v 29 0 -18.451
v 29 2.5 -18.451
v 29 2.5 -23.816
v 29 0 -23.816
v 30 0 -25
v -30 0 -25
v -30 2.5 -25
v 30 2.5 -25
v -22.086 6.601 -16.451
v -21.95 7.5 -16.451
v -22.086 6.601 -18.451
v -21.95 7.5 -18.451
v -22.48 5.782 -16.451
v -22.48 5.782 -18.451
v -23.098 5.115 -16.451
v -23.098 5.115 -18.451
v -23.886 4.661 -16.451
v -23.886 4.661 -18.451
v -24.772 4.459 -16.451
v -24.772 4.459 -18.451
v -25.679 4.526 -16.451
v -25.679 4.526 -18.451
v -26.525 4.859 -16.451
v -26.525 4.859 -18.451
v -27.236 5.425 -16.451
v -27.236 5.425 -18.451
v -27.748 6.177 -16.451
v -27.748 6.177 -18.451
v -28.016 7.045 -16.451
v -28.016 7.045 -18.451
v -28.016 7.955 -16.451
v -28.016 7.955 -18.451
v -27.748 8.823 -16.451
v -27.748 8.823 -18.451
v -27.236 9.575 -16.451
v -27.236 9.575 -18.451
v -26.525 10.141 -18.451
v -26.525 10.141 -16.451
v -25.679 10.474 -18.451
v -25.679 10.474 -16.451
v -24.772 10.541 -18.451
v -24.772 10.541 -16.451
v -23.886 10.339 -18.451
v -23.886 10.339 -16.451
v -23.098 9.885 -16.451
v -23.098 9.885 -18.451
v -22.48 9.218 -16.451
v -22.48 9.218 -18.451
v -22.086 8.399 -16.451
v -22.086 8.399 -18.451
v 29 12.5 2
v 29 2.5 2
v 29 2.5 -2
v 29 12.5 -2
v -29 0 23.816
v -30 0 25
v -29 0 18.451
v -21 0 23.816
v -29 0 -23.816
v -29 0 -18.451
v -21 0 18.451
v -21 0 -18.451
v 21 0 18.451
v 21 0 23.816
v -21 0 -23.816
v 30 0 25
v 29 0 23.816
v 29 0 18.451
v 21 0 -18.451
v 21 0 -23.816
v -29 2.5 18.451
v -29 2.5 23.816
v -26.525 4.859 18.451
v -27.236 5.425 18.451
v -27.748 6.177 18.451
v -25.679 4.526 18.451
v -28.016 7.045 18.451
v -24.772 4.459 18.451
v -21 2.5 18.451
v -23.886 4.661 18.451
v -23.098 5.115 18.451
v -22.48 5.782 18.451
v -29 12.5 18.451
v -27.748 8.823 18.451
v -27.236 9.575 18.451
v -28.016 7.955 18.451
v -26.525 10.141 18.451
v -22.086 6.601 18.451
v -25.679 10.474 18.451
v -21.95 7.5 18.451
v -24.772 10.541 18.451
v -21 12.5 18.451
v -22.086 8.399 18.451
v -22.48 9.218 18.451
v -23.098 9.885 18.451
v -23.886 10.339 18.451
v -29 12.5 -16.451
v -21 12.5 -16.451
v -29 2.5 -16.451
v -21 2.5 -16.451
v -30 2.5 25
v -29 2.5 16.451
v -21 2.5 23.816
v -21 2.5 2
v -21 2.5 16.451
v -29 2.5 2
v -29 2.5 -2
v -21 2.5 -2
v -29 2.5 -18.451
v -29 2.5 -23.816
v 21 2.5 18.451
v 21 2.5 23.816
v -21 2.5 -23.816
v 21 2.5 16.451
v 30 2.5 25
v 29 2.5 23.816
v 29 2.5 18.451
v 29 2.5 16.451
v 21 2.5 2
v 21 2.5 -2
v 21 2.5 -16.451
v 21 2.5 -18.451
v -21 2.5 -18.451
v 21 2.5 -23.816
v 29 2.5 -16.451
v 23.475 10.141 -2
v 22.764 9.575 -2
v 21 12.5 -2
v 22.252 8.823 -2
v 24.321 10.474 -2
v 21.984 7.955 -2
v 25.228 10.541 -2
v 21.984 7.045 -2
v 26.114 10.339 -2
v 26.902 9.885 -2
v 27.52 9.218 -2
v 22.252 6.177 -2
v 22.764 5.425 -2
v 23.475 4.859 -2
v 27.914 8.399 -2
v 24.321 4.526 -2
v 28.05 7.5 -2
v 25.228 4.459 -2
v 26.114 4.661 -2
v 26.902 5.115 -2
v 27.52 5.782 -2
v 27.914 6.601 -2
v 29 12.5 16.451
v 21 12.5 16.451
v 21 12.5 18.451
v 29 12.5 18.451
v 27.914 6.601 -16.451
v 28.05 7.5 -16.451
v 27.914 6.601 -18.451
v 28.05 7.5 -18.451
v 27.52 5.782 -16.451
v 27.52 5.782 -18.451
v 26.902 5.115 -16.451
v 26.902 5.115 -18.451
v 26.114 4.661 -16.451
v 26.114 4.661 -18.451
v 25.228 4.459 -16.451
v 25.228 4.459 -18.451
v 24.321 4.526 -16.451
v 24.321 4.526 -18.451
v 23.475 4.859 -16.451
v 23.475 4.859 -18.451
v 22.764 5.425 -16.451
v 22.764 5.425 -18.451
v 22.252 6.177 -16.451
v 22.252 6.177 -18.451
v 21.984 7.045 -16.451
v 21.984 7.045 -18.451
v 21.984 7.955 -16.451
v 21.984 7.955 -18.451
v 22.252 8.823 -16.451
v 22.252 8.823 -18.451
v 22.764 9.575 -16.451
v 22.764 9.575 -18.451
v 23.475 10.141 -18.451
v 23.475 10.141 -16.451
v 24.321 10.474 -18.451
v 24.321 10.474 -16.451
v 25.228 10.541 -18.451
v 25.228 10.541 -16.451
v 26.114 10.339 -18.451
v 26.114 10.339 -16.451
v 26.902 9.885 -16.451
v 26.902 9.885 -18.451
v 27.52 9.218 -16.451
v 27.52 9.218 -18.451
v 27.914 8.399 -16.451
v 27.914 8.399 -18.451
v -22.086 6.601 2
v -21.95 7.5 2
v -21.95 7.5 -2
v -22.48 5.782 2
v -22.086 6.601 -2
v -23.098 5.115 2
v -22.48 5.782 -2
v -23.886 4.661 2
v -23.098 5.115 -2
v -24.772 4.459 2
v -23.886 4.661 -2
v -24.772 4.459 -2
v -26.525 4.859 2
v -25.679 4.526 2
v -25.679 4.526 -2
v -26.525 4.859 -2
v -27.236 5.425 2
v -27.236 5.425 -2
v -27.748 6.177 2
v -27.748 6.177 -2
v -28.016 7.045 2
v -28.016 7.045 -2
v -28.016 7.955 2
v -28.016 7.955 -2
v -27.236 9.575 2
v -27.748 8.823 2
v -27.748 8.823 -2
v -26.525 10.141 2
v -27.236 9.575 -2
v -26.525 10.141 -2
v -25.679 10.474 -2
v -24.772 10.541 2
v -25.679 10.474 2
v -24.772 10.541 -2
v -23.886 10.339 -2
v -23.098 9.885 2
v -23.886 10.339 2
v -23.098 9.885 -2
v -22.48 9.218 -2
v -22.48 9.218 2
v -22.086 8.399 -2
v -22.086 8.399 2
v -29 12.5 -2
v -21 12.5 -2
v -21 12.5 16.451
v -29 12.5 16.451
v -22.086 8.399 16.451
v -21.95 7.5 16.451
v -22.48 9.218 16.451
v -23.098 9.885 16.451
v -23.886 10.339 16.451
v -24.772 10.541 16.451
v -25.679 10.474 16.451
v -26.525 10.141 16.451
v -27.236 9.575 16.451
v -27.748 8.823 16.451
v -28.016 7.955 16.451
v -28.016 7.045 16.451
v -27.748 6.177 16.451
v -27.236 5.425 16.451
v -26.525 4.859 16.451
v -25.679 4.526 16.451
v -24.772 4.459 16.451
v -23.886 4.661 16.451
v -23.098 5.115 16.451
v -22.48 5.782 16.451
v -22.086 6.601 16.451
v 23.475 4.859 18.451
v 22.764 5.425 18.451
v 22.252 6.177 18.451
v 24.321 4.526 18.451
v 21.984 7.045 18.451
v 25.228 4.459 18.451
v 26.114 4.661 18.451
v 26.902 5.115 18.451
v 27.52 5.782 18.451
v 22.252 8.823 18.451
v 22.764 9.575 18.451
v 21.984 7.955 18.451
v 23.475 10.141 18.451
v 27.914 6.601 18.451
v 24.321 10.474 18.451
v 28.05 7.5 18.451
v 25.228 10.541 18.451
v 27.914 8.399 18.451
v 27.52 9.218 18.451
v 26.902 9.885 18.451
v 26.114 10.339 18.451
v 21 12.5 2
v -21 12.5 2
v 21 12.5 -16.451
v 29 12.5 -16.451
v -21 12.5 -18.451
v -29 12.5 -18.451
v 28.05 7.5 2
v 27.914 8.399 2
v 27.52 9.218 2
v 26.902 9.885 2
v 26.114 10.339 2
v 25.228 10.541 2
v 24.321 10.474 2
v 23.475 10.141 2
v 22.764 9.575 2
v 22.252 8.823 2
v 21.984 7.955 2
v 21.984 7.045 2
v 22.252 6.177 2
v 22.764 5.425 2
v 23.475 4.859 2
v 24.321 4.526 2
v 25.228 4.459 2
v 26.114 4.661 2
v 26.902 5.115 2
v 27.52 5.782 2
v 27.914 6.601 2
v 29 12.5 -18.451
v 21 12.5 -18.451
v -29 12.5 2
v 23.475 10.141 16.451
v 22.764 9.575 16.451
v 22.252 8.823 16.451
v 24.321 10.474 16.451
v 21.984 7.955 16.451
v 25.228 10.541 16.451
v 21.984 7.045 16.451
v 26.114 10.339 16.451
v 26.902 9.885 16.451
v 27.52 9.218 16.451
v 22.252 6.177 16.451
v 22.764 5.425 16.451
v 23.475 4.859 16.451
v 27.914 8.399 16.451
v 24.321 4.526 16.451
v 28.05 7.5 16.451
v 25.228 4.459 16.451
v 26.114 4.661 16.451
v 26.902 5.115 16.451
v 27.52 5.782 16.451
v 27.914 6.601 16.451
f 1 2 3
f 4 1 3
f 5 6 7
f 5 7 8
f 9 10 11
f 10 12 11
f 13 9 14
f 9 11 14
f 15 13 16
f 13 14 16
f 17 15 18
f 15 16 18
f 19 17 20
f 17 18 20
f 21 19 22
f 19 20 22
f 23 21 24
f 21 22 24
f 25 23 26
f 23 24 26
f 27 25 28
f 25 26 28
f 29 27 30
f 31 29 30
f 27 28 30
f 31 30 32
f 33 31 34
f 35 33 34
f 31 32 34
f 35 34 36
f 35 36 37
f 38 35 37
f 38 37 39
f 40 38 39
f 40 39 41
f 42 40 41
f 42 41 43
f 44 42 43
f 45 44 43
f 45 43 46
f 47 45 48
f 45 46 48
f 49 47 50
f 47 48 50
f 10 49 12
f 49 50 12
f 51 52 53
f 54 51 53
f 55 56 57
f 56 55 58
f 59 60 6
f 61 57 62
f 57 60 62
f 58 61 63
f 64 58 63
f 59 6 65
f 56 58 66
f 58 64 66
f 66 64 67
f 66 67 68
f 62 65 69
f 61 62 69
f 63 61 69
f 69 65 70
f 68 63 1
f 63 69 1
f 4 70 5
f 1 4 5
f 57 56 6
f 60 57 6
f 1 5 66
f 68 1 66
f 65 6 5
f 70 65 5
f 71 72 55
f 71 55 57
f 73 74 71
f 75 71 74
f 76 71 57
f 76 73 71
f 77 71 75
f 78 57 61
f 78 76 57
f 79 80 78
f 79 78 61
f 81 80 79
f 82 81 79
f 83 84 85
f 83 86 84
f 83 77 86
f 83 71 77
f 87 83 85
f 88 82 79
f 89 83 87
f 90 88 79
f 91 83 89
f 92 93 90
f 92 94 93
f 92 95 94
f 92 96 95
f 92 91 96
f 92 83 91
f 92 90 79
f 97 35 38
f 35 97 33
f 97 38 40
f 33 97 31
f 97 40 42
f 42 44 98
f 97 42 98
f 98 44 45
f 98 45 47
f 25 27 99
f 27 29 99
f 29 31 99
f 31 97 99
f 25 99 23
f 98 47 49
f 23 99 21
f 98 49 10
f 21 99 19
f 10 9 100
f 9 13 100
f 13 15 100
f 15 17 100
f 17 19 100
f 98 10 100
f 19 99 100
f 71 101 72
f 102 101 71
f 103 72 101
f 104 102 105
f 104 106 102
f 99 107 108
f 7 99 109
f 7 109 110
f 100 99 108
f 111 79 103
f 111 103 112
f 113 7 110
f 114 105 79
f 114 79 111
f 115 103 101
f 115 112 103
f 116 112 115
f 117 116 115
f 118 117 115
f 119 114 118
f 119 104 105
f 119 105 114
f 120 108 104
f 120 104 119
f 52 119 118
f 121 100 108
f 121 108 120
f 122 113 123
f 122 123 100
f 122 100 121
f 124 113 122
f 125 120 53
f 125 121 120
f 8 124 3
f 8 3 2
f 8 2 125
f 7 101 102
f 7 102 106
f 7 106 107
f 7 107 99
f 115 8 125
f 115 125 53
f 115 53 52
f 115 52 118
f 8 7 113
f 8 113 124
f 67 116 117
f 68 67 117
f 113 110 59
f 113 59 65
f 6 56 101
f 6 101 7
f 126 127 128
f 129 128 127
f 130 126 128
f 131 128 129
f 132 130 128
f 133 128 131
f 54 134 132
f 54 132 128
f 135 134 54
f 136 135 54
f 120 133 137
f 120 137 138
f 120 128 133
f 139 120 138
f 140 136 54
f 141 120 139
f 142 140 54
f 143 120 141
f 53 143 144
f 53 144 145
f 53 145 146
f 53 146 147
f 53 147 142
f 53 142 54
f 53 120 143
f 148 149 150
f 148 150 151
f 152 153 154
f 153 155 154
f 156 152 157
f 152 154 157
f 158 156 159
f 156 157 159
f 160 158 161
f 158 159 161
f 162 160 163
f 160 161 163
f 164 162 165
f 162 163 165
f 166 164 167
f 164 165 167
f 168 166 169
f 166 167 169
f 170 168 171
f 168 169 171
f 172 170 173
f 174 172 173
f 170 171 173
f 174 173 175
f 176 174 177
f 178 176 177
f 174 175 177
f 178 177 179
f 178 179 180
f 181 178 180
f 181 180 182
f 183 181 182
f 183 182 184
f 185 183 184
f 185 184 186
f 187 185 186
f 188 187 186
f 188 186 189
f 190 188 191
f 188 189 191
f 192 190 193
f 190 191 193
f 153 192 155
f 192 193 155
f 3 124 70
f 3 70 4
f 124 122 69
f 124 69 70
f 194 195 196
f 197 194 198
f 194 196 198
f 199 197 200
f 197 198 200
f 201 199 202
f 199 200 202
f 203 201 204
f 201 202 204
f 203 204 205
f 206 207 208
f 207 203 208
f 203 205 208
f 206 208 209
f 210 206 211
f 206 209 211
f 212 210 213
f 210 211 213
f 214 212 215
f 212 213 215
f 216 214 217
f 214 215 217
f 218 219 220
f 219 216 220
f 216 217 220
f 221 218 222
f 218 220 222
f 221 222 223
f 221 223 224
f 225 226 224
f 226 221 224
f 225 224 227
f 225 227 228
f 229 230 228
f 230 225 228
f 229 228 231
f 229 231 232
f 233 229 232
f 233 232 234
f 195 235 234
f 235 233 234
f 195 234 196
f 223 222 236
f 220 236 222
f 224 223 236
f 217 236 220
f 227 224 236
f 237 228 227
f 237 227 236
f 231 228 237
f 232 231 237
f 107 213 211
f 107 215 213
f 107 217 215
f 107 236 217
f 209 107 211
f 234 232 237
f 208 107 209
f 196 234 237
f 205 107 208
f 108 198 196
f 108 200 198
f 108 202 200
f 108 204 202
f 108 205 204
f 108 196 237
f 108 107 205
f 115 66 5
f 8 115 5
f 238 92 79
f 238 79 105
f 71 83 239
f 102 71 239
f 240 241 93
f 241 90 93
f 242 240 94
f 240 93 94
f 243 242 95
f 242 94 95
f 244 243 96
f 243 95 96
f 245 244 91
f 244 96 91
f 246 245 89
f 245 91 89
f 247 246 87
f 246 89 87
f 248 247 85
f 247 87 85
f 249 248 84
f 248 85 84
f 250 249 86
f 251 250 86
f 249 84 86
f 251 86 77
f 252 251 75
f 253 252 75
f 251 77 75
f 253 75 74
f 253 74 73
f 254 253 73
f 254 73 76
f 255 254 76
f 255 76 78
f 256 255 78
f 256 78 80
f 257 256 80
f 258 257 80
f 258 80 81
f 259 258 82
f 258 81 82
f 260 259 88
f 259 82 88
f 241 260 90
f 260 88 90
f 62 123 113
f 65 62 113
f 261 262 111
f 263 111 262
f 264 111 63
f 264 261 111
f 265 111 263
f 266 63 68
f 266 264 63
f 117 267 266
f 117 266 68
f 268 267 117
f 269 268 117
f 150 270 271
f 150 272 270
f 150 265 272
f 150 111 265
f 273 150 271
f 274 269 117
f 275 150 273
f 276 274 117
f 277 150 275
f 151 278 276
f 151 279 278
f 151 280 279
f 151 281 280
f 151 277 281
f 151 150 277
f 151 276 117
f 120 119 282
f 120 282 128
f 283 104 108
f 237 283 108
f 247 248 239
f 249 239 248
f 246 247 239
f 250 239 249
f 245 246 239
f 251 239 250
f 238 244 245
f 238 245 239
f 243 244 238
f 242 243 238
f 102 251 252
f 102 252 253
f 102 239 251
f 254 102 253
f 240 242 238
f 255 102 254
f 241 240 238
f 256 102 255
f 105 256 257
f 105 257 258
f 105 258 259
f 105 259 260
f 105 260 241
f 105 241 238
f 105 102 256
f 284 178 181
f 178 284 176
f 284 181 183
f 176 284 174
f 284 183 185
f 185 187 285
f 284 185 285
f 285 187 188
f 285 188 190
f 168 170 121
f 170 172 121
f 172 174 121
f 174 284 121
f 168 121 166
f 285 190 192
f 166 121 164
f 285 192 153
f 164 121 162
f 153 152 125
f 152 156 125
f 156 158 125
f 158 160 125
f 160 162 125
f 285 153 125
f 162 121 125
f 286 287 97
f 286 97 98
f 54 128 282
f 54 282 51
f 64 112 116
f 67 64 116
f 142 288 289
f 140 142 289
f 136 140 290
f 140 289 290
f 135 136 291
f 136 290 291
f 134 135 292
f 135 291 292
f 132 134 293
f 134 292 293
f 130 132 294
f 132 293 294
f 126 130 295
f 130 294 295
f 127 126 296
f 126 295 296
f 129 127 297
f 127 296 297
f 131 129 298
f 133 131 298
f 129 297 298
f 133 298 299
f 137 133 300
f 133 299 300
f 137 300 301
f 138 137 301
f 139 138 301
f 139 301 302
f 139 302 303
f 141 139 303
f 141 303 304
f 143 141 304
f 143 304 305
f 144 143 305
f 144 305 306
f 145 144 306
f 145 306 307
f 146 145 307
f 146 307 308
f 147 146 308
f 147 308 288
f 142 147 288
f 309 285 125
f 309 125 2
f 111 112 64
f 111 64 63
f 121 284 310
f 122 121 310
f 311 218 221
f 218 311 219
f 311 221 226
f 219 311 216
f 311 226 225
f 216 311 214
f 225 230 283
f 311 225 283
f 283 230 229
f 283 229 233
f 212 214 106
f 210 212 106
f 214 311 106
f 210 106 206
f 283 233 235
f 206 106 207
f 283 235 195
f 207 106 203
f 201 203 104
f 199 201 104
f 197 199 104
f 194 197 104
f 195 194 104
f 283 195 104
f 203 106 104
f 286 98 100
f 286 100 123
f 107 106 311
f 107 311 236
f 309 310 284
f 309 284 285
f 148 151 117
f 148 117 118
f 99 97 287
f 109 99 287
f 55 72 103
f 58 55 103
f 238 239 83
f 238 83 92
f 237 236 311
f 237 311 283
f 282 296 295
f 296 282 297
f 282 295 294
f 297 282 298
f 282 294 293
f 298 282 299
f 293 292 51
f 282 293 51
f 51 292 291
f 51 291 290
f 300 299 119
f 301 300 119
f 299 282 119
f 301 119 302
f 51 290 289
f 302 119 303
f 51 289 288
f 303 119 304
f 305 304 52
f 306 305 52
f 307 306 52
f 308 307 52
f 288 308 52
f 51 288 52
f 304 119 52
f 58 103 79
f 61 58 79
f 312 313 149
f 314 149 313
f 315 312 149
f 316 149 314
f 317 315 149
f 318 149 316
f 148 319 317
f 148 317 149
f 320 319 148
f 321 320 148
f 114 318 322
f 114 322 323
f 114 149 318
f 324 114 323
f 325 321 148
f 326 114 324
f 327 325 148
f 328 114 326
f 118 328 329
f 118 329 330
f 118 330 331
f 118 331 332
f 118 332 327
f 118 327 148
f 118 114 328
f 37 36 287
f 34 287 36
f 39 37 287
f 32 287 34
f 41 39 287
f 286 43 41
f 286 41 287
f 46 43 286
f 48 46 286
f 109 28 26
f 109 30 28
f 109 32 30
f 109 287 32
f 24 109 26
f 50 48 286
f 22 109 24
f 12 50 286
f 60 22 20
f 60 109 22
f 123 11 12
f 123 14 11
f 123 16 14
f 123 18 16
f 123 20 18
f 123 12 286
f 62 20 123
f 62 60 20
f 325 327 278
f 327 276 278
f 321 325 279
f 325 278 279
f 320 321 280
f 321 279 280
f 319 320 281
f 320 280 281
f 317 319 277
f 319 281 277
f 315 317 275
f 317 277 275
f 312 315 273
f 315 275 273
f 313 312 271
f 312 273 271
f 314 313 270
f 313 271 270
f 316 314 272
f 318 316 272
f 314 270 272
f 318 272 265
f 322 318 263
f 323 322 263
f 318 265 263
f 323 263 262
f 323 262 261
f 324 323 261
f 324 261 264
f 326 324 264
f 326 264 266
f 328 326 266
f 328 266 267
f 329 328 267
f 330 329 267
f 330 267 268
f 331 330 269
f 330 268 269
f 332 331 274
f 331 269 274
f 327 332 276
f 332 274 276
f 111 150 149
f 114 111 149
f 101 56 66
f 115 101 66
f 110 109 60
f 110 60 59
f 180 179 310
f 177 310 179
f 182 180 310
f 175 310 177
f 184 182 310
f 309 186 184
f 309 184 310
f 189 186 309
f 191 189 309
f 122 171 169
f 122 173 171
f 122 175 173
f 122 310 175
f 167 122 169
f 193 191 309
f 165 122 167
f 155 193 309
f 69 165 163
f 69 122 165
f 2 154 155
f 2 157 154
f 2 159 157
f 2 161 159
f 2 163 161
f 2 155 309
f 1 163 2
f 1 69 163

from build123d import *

# Parameters (mm, degrees)
SKETCH1_W           = 60
SKETCH1_H           = 50
BOSS_EXTRUDE1_DEPTH = 2.5
SKETCH2_W           = 8
SKETCH2_H           = 2
BOSS_EXTRUDE2_DEPTH = 10
CUT_EXTRUDE1_REACH  = 44.252
SKETCH3_R           = 3.05
SKETCH4_W           = 8
SKETCH4_H           = 2
BOSS_EXTRUDE3_DEPTH = 10
CUT_EXTRUDE2_REACH  = 44.252
SKETCH6_R           = 3.05
SKETCH7_W           = 8
SKETCH7_H           = 4
BOSS_EXTRUDE4_DEPTH = 10
CUT_EXTRUDE3_REACH  = 44.252
SKETCH8_R           = 3.05
SKETCH9_W           = 8
SKETCH9_H           = 2
BOSS_EXTRUDE5_DEPTH = 10
CUT_EXTRUDE4_REACH  = 56.261
SKETCH10_R          = 3.05
CUT_EXTRUDE5_REACH  = 56.261
SKETCH12_R          = 3.05
CUT_EXTRUDE6_REACH  = 56.261
SKETCH13_R          = 3.05
CUT_EXTRUDE7_REACH  = 56.261
SKETCH14_R          = 3.05
CUT_EXTRUDE8_REACH  = 42.311
SKETCH15_W          = 8
SKETCH15_H          = 5.36479905


with BuildPart() as part:
    # Sketch1 → Boss-Extrude1 (new body)
    with BuildSketch(Plane(origin=(0, 0, 0), x_dir=(1, 0, 0), z_dir=(0, 1, 0))):
        Rectangle(SKETCH1_W, SKETCH1_H)
    extrude(amount=BOSS_EXTRUDE1_DEPTH)

    # Sketch2 → Boss-Extrude2 (add)
    with BuildSketch(Plane(origin=(0, 2.5, 0), x_dir=(1, 0, 0), z_dir=(0, 1, 0))):
        with Locations((-25, -1)):
            Rectangle(SKETCH2_W, SKETCH2_H)
    extrude(amount=BOSS_EXTRUDE2_DEPTH)

    # Sketch3 → Cut-Extrude1 (cut, up to next)
    with BuildSketch(Plane.XY.offset(2), mode=Mode.PRIVATE) as cut_extrude1_sk1:
        with Locations((-25, 7.5)):
            Circle(SKETCH3_R)
    cut_extrude1_tool1 = extrude(cut_extrude1_sk1.sketch, amount=-CUT_EXTRUDE1_REACH, mode=Mode.PRIVATE) & part.part
    add(cut_extrude1_tool1.solids().sort_by_distance((-25, 7.5, 2))[0], mode=Mode.SUBTRACT)

    # Sketch4 → Boss-Extrude3 (add)
    with BuildSketch(Plane(origin=(0, 2.5, 0), x_dir=(1, 0, 0), z_dir=(0, 1, 0))):
        with Locations((-25, 1)):
            Rectangle(SKETCH4_W, SKETCH4_H)
    extrude(amount=BOSS_EXTRUDE3_DEPTH)

    # Sketch6 → Cut-Extrude2 (cut, up to next)
    with BuildSketch(Plane(origin=(0, 0, -2), x_dir=(-1, 0, 0), z_dir=(0, 0, -1)), mode=Mode.PRIVATE) as cut_extrude2_sk1:
        with Locations(Location((25, 7.5, 0), (0, 0, 180))):
            Circle(SKETCH6_R)
    cut_extrude2_tool1 = extrude(cut_extrude2_sk1.sketch, amount=-CUT_EXTRUDE2_REACH, mode=Mode.PRIVATE) & part.part
    add(cut_extrude2_tool1.solids().sort_by_distance((-25, 7.5, -2))[0], mode=Mode.SUBTRACT)

    # Sketch7 → Boss-Extrude4 (add)
    with BuildSketch(Plane(origin=(0, 2.5, 0), x_dir=(1, 0, 0), z_dir=(0, 1, 0))):
        with Locations((25, 0)):
            Rectangle(SKETCH7_W, SKETCH7_H)
    extrude(amount=BOSS_EXTRUDE4_DEPTH)

    # Sketch8 → Cut-Extrude3 (cut, up to next)
    with BuildSketch(Plane.XY.offset(2), mode=Mode.PRIVATE) as cut_extrude3_sk1:
        with Locations((25, 7.5)):
            Circle(SKETCH8_R)
    cut_extrude3_tool1 = extrude(cut_extrude3_sk1.sketch, amount=-CUT_EXTRUDE3_REACH, mode=Mode.PRIVATE) & part.part
    add(cut_extrude3_tool1.solids().sort_by_distance((25, 7.5, 2))[0], mode=Mode.SUBTRACT)

    # Sketch9 → Boss-Extrude5 (add)
    with BuildSketch(Plane(origin=(0, 2.5, 0), x_dir=(1, 0, 0), z_dir=(0, 1, 0))):
        with Locations((-25, 17.450740252)):
            Rectangle(SKETCH9_W, SKETCH9_H)
        with Locations((-25, -17.450740252)):
            Rectangle(SKETCH9_W, SKETCH9_H)
        with Locations((25, -17.450740252)):
            Rectangle(SKETCH9_W, SKETCH9_H)
        with Locations((25, 17.450740252)):
            Rectangle(SKETCH9_W, SKETCH9_H)
    extrude(amount=BOSS_EXTRUDE5_DEPTH)

    # Sketch10 → Cut-Extrude4 (cut, up to next)
    with BuildSketch(Plane(origin=(0, 0, -18.450740252), x_dir=(-1, 0, 0), z_dir=(0, 0, -1)), mode=Mode.PRIVATE) as cut_extrude4_sk1:
        with Locations(Location((25, 7.5, 0), (0, 0, 180))):
            Circle(SKETCH10_R)
    cut_extrude4_tool1 = extrude(cut_extrude4_sk1.sketch, amount=-CUT_EXTRUDE4_REACH, mode=Mode.PRIVATE) & part.part
    add(cut_extrude4_tool1.solids().sort_by_distance((-25, 7.5, -18.45074))[0], mode=Mode.SUBTRACT)

    # Sketch12 → Cut-Extrude5 (cut, up to next)
    with BuildSketch(Plane.XY.offset(18.450740252), mode=Mode.PRIVATE) as cut_extrude5_sk1:
        with Locations((-25, 7.5)):
            Circle(SKETCH12_R)
    cut_extrude5_tool1 = extrude(cut_extrude5_sk1.sketch, amount=-CUT_EXTRUDE5_REACH, mode=Mode.PRIVATE) & part.part
    add(cut_extrude5_tool1.solids().sort_by_distance((-25, 7.5, 18.45074))[0], mode=Mode.SUBTRACT)

    # Sketch13 → Cut-Extrude6 (cut, up to next)
    with BuildSketch(Plane(origin=(0, 0, -18.450740252), x_dir=(-1, 0, 0), z_dir=(0, 0, -1)), mode=Mode.PRIVATE) as cut_extrude6_sk1:
        with Locations(Location((-25, 7.5, 0), (0, 0, 180))):
            Circle(SKETCH13_R)
    cut_extrude6_tool1 = extrude(cut_extrude6_sk1.sketch, amount=-CUT_EXTRUDE6_REACH, mode=Mode.PRIVATE) & part.part
    add(cut_extrude6_tool1.solids().sort_by_distance((25, 7.5, -18.45074))[0], mode=Mode.SUBTRACT)

    # Sketch14 → Cut-Extrude7 (cut, up to next)
    with BuildSketch(Plane.XY.offset(18.450740252), mode=Mode.PRIVATE) as cut_extrude7_sk1:
        with Locations((25, 7.5)):
            Circle(SKETCH14_R)
    cut_extrude7_tool1 = extrude(cut_extrude7_sk1.sketch, amount=-CUT_EXTRUDE7_REACH, mode=Mode.PRIVATE) & part.part
    add(cut_extrude7_tool1.solids().sort_by_distance((25, 7.5, 18.45074))[0], mode=Mode.SUBTRACT)

    # Sketch15 → Cut-Extrude8 (cut, up to next)
    with BuildSketch(Plane(origin=(0, 2.5, 0), x_dir=(1, 0, 0), z_dir=(0, 1, 0)), mode=Mode.PRIVATE) as cut_extrude8_sk1:
        with Locations((-25, 21.133139777)):
            Rectangle(SKETCH15_W, SKETCH15_H)
    cut_extrude8_tool1 = extrude(cut_extrude8_sk1.sketch, amount=-CUT_EXTRUDE8_REACH, mode=Mode.PRIVATE) & part.part
    # Sketch15 → Cut-Extrude8 (cut, up to next)
    with BuildSketch(Plane(origin=(0, 2.5, 0), x_dir=(1, 0, 0), z_dir=(0, 1, 0)), mode=Mode.PRIVATE) as cut_extrude8_sk2:
        with Locations((25, 21.133139777)):
            Rectangle(SKETCH15_W, SKETCH15_H)
    cut_extrude8_tool2 = extrude(cut_extrude8_sk2.sketch, amount=-CUT_EXTRUDE8_REACH, mode=Mode.PRIVATE) & part.part
    # Sketch15 → Cut-Extrude8 (cut, up to next)
    with BuildSketch(Plane(origin=(0, 2.5, 0), x_dir=(1, 0, 0), z_dir=(0, 1, 0)), mode=Mode.PRIVATE) as cut_extrude8_sk3:
        with Locations((-25, -21.133139777)):
            Rectangle(SKETCH15_W, SKETCH15_H)
    cut_extrude8_tool3 = extrude(cut_extrude8_sk3.sketch, amount=-CUT_EXTRUDE8_REACH, mode=Mode.PRIVATE) & part.part
    # Sketch15 → Cut-Extrude8 (cut, up to next)
    with BuildSketch(Plane(origin=(0, 2.5, 0), x_dir=(1, 0, 0), z_dir=(0, 1, 0)), mode=Mode.PRIVATE) as cut_extrude8_sk4:
        with Locations((25, -21.133139777)):
            Rectangle(SKETCH15_W, SKETCH15_H)
    cut_extrude8_tool4 = extrude(cut_extrude8_sk4.sketch, amount=-CUT_EXTRUDE8_REACH, mode=Mode.PRIVATE) & part.part
    add(cut_extrude8_tool1.solids().sort_by_distance((-25, 2.5, -21.13314))[0], mode=Mode.SUBTRACT)
    add(cut_extrude8_tool2.solids().sort_by_distance((25, 2.5, -21.13314))[0], mode=Mode.SUBTRACT)
    add(cut_extrude8_tool3.solids().sort_by_distance((-25, 2.5, 21.13314))[0], mode=Mode.SUBTRACT)
    add(cut_extrude8_tool4.solids().sort_by_distance((25, 2.5, 21.13314))[0], mode=Mode.SUBTRACT)


solid = part.part
